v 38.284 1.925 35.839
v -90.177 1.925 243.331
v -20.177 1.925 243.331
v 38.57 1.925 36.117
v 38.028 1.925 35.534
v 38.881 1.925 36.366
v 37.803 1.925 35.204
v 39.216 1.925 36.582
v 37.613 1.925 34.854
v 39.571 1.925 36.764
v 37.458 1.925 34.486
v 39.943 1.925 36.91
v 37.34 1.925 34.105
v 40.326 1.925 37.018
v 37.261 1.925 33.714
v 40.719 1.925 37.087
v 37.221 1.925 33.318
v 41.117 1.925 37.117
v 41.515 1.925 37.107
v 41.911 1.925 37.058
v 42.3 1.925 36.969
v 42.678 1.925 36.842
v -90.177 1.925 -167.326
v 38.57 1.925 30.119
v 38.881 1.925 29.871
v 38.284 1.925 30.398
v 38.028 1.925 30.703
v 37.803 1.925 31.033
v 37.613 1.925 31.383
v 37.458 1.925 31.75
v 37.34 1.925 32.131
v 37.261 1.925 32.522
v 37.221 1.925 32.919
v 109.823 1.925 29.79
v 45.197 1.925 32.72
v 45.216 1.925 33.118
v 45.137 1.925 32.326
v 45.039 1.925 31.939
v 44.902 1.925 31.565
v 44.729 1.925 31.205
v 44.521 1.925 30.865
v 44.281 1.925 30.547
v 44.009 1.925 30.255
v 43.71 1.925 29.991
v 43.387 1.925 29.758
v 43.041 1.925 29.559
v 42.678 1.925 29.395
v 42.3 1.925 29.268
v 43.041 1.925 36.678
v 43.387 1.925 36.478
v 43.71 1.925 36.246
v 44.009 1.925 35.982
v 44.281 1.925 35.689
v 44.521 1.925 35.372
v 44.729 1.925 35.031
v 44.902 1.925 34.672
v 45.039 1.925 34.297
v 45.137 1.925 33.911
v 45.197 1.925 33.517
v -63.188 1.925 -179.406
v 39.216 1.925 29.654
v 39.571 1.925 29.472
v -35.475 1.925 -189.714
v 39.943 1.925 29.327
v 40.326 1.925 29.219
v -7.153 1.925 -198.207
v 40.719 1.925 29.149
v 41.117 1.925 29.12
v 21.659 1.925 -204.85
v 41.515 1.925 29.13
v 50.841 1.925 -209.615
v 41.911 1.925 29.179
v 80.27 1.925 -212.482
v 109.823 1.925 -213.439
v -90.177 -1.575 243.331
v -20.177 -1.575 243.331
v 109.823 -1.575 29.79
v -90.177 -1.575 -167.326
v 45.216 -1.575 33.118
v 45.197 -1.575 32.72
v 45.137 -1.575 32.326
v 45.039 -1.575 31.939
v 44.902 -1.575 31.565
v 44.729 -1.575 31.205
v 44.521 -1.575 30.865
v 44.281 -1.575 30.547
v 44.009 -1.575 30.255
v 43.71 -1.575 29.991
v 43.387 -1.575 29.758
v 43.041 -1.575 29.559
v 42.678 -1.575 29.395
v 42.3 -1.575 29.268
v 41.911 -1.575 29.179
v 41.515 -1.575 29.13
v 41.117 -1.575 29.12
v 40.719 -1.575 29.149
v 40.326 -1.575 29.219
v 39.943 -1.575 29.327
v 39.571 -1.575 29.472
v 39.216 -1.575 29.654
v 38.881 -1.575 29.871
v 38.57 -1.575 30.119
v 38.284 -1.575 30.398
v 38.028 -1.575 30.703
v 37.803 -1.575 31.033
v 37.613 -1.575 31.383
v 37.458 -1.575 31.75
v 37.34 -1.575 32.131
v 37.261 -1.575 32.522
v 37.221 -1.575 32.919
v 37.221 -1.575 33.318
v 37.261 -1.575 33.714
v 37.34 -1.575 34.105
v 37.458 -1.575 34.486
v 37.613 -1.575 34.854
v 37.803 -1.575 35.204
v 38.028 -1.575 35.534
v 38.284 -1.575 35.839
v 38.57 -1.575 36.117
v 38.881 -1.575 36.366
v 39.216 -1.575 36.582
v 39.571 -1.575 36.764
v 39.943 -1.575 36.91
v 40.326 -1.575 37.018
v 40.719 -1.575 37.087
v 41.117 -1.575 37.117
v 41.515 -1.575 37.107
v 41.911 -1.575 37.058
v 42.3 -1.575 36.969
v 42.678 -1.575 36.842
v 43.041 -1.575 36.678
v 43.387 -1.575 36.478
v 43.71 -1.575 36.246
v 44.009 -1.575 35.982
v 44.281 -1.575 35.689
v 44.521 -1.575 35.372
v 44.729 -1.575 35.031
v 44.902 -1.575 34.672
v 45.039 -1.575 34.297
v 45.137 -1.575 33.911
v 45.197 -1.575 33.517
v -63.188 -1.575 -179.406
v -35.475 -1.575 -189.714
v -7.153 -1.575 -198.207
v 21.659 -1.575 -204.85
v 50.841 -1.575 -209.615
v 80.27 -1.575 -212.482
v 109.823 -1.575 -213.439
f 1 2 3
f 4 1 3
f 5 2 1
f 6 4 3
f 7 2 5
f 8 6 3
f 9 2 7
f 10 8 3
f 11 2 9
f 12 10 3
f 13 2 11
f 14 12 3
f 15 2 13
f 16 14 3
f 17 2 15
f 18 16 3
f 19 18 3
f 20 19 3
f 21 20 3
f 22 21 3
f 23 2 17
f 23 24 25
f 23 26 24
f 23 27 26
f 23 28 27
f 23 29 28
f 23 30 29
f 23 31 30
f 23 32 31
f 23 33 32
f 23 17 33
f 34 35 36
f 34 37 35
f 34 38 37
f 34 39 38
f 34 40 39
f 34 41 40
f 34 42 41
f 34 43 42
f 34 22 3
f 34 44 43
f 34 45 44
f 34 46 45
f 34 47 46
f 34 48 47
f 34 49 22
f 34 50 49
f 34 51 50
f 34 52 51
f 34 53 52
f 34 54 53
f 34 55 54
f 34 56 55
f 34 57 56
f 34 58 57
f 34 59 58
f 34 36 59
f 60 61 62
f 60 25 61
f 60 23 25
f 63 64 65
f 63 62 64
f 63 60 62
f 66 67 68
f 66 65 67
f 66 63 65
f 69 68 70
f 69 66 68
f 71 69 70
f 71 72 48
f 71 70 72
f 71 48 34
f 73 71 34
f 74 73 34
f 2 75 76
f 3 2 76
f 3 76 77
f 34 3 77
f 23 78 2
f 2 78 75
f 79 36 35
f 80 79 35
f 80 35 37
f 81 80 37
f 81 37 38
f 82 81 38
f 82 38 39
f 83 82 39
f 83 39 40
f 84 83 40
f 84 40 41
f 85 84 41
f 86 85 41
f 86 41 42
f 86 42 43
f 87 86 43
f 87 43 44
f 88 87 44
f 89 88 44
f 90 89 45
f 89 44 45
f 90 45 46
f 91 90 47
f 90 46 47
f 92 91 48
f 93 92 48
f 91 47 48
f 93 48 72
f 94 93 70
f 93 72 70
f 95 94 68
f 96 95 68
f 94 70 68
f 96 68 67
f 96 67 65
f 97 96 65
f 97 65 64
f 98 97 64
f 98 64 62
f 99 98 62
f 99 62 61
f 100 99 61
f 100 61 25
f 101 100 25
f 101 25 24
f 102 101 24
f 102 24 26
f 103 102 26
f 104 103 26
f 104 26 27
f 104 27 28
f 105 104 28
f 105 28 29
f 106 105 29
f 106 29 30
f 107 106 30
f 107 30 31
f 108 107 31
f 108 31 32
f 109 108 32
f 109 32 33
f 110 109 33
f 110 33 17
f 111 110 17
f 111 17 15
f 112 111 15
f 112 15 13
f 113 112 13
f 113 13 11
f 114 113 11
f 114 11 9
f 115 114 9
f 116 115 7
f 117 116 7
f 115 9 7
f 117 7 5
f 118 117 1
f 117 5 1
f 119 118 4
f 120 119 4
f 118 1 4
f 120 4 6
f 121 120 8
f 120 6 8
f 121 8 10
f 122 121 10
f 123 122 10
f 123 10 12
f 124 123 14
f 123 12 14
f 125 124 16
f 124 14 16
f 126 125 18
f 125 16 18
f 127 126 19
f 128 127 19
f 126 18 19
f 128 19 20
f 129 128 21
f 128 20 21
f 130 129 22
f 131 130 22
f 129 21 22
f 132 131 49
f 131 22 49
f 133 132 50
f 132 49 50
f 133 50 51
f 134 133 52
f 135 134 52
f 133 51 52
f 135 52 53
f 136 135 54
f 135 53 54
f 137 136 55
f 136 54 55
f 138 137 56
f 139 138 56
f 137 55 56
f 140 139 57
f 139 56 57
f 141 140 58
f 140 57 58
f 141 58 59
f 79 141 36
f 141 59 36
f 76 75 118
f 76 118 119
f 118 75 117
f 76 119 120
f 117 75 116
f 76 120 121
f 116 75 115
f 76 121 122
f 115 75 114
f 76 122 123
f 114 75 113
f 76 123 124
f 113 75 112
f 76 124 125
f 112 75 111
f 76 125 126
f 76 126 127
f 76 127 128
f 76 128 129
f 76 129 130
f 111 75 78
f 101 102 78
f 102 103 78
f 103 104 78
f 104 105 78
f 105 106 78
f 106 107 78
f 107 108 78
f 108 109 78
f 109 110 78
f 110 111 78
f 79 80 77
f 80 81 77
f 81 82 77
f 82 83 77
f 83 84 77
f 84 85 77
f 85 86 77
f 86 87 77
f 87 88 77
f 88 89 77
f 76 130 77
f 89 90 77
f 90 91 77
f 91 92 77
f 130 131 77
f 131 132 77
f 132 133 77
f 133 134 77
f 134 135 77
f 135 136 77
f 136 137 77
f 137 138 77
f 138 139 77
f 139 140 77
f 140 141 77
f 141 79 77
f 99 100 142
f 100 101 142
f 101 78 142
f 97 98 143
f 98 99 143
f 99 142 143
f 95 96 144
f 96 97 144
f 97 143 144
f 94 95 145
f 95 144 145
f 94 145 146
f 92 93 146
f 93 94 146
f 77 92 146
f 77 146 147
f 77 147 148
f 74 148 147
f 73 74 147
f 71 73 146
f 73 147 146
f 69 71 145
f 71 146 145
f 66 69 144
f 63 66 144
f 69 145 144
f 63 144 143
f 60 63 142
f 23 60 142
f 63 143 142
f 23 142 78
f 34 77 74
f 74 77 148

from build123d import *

# Parameters (mm, degrees)
BOSS_EXTRUDE1_DEPTH     = 0.35
SCALE1_SCALE            = 10
SKETCH2_R               = 4
CUT_EXTRUDE1_DEPTH      = 1
CUT_EXTRUDE1_DEPTH_BACK = 4.5


with BuildPart() as part:
    # Sketch1 → Boss-Extrude1 (new body)
    with BuildSketch(Plane(origin=(0, 0, 0), x_dir=(1, 0, 0), z_dir=(0, 1, 0))):
        with BuildLine():
            Line((-0.845785748, -19.220149774), (12.154214252, 2.13400673))
            Line((12.154214252, 2.13400673), (12.154214252, 26.456928478))
            ThreePointArc((12.154214252, 26.456928478), (1.891851134, 25.289168137), (-7.845785748, 21.84559602))
            Line((-7.845785748, 21.84559602), (-7.845785748, -19.220149774))
            Line((-7.845785748, -19.220149774), (-0.845785748, -19.220149774))
        make_face()
    extrude(amount=BOSS_EXTRUDE1_DEPTH)


with BuildPart() as part_1:
    # Scale1: scaled about (1.302109207, 0.175, -5.681101669)
    add(part.part.scale(SCALE1_SCALE).moved(Location((-11.718982863, -1.575, 51.129915021))))

    # Sketch2 → Cut-Extrude1 (cut, two sides)
    with BuildSketch(Plane(origin=(0, 1.925, 0), x_dir=(1, 0, 0), z_dir=(0, 1, 0))) as cut_extrude1_sk:
        with Locations((41.216468576, -33.118318866)):
            Circle(SKETCH2_R)
    extrude(amount=CUT_EXTRUDE1_DEPTH, mode=Mode.SUBTRACT)
    extrude(cut_extrude1_sk.sketch, amount=-CUT_EXTRUDE1_DEPTH_BACK, mode=Mode.SUBTRACT)


solid = part_1.part
